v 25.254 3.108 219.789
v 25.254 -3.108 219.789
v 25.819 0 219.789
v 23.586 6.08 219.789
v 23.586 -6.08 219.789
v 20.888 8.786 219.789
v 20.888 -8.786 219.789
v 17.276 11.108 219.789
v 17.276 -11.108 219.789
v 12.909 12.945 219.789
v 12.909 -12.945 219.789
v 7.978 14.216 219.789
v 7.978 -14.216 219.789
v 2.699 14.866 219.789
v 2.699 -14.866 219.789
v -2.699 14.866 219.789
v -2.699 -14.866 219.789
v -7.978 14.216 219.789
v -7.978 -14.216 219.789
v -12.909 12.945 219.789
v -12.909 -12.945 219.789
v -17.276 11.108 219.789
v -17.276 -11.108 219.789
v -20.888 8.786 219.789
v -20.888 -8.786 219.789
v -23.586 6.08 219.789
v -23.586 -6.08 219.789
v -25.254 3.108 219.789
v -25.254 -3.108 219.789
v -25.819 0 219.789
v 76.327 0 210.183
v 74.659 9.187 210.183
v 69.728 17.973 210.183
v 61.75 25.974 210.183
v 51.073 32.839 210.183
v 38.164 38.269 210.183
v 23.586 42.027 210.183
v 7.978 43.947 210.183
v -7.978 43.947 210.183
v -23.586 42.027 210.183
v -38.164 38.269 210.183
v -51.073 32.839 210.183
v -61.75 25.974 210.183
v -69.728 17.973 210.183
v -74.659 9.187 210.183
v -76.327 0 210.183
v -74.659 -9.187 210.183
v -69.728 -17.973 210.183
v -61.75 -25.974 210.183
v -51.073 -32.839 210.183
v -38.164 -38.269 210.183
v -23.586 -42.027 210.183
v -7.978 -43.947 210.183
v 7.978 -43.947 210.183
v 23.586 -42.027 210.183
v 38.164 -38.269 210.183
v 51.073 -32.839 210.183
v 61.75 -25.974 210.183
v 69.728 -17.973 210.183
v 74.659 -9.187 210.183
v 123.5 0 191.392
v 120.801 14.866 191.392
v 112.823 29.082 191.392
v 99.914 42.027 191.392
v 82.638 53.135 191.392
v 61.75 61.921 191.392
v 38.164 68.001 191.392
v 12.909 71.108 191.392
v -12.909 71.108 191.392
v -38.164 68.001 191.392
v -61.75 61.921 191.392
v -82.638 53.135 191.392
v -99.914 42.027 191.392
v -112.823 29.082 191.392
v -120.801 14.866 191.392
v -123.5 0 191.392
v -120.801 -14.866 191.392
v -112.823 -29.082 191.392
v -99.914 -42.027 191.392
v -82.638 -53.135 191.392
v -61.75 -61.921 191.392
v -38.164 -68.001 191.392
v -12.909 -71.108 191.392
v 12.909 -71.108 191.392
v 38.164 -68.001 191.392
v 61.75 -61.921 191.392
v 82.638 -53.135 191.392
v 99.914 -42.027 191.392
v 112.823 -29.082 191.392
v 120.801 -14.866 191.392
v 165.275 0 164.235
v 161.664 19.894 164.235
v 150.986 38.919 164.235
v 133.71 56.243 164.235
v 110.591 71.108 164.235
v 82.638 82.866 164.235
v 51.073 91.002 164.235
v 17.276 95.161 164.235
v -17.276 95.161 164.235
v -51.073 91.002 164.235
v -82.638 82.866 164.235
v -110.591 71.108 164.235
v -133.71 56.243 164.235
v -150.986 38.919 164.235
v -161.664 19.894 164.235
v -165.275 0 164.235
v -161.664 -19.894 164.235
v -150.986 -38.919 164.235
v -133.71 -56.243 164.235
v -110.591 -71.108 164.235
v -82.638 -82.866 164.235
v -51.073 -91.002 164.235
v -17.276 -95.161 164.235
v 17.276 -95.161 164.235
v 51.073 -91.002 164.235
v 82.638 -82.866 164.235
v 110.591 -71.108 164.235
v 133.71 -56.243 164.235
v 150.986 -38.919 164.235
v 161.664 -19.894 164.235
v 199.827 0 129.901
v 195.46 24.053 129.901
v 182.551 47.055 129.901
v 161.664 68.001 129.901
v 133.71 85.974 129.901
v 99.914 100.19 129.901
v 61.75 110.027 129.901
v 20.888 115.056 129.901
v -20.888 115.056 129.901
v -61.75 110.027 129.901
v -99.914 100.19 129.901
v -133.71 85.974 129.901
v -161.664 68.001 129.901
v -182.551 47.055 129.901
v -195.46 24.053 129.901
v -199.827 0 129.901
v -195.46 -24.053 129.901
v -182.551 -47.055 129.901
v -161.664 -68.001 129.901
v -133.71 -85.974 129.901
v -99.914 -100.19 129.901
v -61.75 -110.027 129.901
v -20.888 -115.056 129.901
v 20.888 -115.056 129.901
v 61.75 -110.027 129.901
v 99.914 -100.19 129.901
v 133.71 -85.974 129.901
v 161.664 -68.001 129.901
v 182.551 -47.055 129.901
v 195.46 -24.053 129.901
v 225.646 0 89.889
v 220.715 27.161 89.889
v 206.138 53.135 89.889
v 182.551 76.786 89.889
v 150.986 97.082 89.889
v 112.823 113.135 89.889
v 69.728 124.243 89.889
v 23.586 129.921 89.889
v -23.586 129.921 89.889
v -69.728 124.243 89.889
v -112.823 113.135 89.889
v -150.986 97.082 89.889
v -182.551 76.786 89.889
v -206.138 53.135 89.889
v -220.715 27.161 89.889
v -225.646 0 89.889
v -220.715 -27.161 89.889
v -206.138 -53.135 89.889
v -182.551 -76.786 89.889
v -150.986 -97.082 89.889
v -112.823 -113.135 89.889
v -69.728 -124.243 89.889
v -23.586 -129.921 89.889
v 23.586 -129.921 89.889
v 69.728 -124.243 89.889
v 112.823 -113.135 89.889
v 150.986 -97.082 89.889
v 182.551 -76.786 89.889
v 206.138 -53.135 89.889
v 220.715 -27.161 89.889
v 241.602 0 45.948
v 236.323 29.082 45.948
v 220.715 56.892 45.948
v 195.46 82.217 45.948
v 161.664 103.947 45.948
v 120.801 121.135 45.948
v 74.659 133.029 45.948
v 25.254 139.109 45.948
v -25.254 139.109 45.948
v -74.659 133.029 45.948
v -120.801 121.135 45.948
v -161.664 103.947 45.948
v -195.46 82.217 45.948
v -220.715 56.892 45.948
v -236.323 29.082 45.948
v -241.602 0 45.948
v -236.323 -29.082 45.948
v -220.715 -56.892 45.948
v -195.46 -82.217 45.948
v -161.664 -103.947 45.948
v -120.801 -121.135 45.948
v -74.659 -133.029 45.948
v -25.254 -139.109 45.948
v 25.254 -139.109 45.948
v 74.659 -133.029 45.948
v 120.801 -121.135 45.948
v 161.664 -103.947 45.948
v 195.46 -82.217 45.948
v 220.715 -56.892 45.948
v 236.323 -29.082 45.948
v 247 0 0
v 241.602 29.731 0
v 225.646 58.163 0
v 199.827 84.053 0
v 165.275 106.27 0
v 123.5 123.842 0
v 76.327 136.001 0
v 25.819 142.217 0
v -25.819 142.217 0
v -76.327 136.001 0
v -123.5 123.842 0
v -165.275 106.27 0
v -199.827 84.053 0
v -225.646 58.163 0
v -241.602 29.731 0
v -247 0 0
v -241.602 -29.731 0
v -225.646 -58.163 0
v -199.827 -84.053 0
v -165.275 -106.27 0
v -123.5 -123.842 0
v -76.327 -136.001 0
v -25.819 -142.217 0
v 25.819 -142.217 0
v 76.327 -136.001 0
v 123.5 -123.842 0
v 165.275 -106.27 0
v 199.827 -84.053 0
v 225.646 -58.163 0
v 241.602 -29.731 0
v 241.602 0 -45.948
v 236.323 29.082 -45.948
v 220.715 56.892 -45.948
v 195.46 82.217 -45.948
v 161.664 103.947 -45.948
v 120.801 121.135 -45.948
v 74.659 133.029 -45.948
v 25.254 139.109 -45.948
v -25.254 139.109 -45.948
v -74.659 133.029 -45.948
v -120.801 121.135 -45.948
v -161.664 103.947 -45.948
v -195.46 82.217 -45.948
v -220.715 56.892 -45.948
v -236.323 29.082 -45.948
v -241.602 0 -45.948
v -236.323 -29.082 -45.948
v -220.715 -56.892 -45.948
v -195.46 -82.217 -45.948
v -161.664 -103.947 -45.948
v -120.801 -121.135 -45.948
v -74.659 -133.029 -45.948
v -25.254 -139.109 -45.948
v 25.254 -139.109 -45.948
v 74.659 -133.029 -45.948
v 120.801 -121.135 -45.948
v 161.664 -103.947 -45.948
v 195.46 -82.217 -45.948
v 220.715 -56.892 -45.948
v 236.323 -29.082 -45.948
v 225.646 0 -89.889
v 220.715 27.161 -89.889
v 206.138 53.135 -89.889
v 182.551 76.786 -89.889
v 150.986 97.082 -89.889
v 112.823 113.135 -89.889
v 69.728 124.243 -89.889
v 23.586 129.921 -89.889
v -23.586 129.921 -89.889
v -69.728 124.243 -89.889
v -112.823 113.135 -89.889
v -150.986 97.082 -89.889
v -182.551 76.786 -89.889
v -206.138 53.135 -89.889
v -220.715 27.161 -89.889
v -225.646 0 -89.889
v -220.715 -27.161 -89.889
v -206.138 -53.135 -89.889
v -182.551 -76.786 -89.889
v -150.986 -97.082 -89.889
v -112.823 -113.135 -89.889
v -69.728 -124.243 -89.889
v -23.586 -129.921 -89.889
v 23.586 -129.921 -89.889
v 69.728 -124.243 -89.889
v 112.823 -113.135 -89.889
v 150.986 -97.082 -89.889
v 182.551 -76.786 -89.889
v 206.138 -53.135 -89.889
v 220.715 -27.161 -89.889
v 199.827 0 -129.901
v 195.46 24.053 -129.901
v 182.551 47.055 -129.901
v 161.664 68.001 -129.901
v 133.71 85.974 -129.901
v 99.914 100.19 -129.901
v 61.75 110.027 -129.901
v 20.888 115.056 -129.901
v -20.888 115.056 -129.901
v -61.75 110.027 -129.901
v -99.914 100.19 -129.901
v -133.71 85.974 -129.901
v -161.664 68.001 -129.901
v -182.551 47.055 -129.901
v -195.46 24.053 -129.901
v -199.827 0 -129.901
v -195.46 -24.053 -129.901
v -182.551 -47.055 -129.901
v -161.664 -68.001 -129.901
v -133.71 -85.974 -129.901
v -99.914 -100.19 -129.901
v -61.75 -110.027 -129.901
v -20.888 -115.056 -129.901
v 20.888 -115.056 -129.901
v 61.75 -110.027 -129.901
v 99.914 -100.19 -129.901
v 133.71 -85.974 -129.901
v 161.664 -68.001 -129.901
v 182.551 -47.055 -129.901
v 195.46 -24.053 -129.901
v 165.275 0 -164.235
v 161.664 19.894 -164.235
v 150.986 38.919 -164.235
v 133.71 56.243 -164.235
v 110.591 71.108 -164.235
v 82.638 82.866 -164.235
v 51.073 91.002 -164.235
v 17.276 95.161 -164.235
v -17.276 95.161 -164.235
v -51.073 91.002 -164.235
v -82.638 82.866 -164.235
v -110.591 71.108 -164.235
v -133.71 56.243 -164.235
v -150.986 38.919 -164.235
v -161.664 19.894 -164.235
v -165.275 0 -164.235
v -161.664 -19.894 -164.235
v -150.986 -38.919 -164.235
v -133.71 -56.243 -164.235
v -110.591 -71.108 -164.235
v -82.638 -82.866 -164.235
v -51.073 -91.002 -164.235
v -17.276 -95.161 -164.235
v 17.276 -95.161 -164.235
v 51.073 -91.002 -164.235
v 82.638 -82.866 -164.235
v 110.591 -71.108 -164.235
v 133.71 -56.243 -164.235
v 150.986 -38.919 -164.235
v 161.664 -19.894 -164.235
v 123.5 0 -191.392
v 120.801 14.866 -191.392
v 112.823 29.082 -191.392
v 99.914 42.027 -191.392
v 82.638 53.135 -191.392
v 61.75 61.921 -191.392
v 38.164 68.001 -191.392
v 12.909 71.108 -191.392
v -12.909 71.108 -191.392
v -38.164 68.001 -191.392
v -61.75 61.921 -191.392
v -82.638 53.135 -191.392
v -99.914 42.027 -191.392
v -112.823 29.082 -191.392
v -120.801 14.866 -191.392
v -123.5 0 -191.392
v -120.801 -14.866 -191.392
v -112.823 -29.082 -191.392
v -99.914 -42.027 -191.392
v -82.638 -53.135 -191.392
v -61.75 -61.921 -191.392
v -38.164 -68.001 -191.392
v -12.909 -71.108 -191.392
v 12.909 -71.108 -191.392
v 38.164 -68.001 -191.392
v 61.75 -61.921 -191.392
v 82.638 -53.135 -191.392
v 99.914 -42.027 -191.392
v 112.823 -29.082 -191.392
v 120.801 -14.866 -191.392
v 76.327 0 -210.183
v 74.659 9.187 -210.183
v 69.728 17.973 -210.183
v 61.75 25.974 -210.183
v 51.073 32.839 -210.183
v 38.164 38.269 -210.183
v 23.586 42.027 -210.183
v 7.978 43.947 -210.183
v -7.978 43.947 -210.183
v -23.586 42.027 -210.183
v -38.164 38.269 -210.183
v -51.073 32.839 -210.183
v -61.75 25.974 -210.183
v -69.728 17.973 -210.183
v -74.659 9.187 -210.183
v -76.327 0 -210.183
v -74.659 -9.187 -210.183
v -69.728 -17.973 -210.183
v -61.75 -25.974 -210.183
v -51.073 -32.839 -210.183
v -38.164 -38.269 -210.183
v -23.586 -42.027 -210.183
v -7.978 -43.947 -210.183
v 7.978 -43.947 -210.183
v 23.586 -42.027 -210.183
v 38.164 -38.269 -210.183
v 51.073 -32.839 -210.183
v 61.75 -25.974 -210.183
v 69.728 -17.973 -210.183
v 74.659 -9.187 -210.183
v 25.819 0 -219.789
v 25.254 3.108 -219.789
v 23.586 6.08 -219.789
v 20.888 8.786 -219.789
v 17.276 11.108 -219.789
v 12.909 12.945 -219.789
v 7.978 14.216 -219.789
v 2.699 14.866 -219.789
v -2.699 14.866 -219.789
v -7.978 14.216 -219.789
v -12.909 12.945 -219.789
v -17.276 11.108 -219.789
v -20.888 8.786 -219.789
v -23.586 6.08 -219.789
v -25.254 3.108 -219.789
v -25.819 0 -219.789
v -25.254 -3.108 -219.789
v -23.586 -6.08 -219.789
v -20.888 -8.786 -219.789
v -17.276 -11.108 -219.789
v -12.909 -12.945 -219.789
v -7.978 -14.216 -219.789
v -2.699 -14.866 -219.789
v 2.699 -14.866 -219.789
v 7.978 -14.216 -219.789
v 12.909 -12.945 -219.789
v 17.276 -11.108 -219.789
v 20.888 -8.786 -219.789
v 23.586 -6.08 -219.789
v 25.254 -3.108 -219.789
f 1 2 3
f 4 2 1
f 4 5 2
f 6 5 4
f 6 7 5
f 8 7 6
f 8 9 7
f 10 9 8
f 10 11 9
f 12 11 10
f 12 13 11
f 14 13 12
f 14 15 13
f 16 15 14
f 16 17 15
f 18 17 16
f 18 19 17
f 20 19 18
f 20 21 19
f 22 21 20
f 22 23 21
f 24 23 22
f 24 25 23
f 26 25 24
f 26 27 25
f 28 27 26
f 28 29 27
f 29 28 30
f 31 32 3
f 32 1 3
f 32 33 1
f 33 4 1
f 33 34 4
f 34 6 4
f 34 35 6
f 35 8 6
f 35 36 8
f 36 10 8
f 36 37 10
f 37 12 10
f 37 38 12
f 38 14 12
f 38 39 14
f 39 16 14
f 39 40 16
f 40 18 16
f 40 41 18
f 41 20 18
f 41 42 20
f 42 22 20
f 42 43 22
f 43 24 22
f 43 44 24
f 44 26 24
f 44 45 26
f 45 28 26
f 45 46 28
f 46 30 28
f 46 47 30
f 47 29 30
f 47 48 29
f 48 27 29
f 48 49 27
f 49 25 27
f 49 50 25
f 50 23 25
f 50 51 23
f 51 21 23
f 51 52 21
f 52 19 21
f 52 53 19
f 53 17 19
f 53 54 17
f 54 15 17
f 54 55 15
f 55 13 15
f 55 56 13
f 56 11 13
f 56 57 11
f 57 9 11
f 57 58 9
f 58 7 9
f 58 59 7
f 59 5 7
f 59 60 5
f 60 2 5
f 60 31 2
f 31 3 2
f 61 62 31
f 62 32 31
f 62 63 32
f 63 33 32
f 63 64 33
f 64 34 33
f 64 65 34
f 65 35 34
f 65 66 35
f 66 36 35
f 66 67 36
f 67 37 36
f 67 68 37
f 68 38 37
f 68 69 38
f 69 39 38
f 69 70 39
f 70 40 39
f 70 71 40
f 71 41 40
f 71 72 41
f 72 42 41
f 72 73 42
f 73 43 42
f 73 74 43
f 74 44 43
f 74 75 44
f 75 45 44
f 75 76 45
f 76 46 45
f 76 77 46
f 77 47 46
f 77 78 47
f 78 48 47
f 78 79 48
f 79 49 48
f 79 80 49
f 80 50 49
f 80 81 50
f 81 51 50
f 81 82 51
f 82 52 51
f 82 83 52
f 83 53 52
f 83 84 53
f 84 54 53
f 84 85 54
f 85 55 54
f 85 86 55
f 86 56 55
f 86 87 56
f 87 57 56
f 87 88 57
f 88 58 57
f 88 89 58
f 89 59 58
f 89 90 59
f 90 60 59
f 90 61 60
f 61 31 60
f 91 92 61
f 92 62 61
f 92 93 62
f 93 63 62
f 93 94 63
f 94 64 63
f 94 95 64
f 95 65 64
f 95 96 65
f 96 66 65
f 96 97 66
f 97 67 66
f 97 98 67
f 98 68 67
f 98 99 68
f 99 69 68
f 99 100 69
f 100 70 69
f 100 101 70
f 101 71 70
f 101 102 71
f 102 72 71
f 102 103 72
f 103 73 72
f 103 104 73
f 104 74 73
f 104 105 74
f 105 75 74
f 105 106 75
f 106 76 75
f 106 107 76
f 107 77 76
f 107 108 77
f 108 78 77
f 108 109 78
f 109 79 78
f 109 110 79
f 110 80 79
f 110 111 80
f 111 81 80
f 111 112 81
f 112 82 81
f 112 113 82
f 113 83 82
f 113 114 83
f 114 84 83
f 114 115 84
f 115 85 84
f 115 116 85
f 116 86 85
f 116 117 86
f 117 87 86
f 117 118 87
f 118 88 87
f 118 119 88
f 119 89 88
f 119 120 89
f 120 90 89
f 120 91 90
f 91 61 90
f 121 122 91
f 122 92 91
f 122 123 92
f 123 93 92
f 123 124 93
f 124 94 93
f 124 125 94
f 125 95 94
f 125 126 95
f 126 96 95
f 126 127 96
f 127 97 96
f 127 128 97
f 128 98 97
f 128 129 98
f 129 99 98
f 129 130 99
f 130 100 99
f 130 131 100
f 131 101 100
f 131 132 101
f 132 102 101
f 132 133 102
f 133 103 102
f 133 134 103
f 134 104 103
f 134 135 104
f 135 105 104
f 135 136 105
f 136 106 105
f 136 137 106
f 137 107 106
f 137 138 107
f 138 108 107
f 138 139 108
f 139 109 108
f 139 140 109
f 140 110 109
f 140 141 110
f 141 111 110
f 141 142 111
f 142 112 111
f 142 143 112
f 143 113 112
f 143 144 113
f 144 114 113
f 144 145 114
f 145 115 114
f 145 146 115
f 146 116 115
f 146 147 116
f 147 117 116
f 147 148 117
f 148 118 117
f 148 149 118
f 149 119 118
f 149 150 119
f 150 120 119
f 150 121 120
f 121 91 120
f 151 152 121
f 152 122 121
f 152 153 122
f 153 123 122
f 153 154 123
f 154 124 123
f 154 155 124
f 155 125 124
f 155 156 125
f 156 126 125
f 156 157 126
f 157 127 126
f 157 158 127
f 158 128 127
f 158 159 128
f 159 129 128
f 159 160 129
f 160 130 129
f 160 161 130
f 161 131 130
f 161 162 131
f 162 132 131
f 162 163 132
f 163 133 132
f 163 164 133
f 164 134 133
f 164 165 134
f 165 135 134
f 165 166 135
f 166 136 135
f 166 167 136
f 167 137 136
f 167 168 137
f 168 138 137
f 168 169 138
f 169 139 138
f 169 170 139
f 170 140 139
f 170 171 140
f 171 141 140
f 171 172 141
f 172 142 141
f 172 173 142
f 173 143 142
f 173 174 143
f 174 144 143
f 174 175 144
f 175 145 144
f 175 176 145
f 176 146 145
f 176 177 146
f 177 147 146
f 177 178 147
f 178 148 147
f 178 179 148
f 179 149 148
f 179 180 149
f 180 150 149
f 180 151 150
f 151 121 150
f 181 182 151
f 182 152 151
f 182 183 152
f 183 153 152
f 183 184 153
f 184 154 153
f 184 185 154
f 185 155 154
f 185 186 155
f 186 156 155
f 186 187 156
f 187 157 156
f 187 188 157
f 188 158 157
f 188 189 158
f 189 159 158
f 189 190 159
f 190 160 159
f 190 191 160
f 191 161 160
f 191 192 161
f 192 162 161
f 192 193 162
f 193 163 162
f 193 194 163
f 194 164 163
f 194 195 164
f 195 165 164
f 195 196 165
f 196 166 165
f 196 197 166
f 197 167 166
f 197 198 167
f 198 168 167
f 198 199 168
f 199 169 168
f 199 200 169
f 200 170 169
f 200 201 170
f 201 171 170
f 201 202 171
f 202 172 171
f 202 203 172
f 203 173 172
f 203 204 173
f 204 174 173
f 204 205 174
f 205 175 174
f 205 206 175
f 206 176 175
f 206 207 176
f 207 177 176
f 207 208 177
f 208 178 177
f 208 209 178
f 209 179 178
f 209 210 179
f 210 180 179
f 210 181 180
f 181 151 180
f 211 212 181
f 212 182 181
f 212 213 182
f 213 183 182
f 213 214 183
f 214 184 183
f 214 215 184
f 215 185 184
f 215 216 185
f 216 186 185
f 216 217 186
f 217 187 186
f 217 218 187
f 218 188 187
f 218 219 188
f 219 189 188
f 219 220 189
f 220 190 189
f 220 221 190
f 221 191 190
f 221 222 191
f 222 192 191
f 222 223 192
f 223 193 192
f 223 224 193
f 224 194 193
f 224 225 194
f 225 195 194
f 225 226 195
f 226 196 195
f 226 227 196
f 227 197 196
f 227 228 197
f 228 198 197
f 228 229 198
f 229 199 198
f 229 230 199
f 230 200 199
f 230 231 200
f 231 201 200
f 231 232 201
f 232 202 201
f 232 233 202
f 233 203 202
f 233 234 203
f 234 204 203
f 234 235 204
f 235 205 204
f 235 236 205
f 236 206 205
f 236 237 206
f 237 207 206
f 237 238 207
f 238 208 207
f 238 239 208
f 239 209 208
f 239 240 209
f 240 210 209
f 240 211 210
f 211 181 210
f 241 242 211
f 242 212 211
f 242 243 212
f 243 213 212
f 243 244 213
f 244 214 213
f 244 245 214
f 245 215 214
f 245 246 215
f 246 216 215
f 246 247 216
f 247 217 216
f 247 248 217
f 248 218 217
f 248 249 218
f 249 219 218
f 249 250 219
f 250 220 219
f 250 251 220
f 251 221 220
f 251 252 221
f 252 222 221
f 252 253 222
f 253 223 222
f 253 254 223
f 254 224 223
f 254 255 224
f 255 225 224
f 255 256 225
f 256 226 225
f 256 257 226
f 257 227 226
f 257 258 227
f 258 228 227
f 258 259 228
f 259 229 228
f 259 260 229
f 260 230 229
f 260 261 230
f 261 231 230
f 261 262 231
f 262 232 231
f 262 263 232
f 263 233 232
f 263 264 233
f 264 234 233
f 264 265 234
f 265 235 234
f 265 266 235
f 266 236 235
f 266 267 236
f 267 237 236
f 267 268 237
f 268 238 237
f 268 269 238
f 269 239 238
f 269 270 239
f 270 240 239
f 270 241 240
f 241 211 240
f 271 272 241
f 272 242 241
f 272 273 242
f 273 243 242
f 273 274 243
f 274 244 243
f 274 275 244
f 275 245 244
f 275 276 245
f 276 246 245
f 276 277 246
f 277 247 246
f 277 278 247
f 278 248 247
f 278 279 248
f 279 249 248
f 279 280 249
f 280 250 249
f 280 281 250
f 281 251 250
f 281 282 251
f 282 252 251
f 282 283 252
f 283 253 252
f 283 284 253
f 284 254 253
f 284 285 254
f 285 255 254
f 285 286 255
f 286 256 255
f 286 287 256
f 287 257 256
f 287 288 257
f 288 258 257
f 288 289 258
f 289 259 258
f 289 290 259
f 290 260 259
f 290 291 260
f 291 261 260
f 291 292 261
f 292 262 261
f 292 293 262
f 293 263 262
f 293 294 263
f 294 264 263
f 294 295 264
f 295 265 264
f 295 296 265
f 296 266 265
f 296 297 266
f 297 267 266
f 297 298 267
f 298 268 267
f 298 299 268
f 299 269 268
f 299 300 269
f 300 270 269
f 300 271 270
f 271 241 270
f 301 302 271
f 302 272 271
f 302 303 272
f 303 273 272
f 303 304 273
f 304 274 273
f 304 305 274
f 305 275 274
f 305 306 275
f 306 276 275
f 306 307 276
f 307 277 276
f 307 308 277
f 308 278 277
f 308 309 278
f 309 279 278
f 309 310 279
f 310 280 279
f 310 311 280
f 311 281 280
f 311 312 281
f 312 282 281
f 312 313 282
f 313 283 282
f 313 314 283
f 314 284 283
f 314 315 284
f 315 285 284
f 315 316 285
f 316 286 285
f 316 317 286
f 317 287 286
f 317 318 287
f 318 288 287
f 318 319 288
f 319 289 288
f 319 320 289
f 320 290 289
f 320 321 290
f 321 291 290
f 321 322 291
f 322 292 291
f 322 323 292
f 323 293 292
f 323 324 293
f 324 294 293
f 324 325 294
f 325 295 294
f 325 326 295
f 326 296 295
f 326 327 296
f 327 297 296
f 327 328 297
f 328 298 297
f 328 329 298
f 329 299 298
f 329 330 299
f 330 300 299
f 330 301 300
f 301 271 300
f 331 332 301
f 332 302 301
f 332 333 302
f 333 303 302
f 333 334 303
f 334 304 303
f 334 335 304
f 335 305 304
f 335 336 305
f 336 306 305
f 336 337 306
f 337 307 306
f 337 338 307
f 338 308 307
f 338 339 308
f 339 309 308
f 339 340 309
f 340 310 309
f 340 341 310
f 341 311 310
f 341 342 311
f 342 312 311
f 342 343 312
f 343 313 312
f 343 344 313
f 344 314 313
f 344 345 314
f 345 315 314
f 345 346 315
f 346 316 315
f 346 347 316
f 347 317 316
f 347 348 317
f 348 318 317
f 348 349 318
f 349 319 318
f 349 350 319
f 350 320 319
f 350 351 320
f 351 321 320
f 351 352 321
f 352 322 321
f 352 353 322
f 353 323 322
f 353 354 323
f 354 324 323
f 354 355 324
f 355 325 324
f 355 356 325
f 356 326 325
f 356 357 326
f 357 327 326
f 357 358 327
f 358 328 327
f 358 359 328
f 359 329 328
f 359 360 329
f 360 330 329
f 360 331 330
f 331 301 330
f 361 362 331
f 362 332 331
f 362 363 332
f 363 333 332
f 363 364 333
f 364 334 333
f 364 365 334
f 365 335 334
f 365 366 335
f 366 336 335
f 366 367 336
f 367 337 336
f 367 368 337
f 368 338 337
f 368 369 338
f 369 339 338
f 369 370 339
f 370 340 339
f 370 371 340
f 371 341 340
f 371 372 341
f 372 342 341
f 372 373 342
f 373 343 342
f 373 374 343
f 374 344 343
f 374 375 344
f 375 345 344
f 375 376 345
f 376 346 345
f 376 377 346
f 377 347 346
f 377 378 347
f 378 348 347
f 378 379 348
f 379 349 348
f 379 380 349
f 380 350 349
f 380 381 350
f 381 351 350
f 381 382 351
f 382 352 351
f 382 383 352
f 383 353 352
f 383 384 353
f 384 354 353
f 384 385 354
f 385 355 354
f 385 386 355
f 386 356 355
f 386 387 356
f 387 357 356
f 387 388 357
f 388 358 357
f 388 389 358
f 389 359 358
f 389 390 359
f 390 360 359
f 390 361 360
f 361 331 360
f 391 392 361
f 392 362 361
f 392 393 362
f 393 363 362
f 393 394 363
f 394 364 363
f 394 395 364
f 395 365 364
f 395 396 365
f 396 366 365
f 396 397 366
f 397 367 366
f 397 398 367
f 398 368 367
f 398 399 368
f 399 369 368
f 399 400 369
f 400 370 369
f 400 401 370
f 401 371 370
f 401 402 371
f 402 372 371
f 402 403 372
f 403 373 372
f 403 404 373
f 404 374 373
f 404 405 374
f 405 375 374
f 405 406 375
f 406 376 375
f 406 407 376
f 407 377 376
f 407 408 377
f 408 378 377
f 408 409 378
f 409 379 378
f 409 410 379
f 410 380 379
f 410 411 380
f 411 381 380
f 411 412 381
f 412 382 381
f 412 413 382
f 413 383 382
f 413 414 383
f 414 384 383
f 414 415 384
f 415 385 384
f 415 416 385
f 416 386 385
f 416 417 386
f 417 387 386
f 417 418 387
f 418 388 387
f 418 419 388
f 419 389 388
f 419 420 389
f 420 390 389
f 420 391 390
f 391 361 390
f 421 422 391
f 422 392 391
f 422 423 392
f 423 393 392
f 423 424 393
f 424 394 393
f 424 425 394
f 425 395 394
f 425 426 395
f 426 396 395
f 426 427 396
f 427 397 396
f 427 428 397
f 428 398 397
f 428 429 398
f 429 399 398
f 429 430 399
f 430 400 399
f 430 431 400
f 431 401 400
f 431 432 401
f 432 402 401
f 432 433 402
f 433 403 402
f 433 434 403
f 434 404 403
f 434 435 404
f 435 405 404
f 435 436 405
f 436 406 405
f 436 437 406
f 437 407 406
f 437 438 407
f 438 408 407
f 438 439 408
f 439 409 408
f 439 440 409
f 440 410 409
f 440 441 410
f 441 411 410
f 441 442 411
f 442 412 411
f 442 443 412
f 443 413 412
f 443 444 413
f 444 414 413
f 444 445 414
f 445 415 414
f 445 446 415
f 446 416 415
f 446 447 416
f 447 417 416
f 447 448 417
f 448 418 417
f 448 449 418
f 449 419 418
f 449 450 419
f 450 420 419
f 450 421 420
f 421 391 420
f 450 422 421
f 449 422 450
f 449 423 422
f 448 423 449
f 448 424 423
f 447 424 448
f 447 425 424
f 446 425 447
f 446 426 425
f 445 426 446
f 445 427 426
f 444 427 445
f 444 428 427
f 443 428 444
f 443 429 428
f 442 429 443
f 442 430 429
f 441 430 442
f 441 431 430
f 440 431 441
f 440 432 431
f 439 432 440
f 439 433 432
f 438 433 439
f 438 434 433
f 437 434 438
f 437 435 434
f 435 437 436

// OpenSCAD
// Generated by SolidPython 1.0.1 on 2020-07-29 00:46:54


scale(v = [19, 11, 17]) {
	sphere(r = 13);
}
/***********************************************
*********      SolidPython code:      **********
************************************************
 
# import packages: SolidPython
from solid import *
from solid.utils import *
from itertools import chain, combinations, permutations


class Resize:

    def __init__(self, scad_file):
        self.scad_file = scad_file
        #self.scad_file = import_scad(scad_file)
        # cone/cylinder param:
        self.r1 = 0
        self.r2 = 0
        self.h = 0
        # rectangular prism param:
        self.w = 0
        self.l = 0
        # ellipse param:
        self.r = 0

    # import OpenScad code (file name corresponds to shape)


    # classify shape + parameters
    def assign(self, param1, param2, param3):
        if self.scad_file == 'cone.scad':
            self.r1 = param1
            self.r2 = param2
            self.h = param3
        elif self.scad_file == 'cylinder.scad':
            self.r1 = param1
            self.r2 = param2
            self.h = param3
        elif self.scad_file == 'rectangularPrism.scad':
            self.h = param1
            self.l = param2
            self.w = param3
        else:
            self.r = param1
            self.h = param2

    # resize parameters
    def iterate(self):
        x = range(3, 20, 2)
        i = 1
        if self.scad_file == 'cone.scad':
            tempList = list(permutations(x, 2))
            for temp in tempList:
                param1 = temp[0]
                param2 = temp[1]
                filepath = 'produced_scad_files/' + 'cone' + str(param1) + '_' + str(param2) + '_' + '.scad'
                scad_render_to_file(cylinder(h=param1, r1=param2, r2=0), filepath)

        elif self.scad_file == 'cylinder.scad':
            tempList = list(permutations(x, 3))
            for temp in tempList:
                param1 = temp[0]
                param2 = temp[1]
                filepath = 'produced_scad_files/' + 'cylinder' + str(param1) + '_' + str(param2) + '_' + '.scad'
                scad_render_to_file(cylinder(h=param1, r1=param2, r2=param2), filepath)

        elif self.scad_file == 'rectangularPrism.scad':
            tempList = list(permutations(x, 3))
            for temp in tempList:
                param1 = temp[0]
                param2 = temp[1]
                param3 = temp[2]
                filepath = 'produced_scad_files/' + 'rectangularPrism' + str(param1) + '_' + str(param2) + '_' + str(
                    param3) + '.scad'
                scad_render_to_file(cube(size=(param1, param2, param3)), filepath)

        elif self.scad_file == 'ellipse.scad':
            tempList = list(permutations(x, 4))
            for temp in tempList:
                param1 = temp[0]
                param2 = temp[1]
                param3 = temp[2]
                param4 = temp[3]
                filepath = 'produced_scad_files/' + 'ellipse' + str(param1) + '_' + str(param2) + '_' + str(param3) + '_' + str(param4) + '.scad'
                scad_render_to_file(scale([param1, param2, param3])(sphere(r=param4)), filepath)

    def render_to_scadfile(self):
        scad_render_to_file(scad, 'example.scad') 
 
************************************************/
